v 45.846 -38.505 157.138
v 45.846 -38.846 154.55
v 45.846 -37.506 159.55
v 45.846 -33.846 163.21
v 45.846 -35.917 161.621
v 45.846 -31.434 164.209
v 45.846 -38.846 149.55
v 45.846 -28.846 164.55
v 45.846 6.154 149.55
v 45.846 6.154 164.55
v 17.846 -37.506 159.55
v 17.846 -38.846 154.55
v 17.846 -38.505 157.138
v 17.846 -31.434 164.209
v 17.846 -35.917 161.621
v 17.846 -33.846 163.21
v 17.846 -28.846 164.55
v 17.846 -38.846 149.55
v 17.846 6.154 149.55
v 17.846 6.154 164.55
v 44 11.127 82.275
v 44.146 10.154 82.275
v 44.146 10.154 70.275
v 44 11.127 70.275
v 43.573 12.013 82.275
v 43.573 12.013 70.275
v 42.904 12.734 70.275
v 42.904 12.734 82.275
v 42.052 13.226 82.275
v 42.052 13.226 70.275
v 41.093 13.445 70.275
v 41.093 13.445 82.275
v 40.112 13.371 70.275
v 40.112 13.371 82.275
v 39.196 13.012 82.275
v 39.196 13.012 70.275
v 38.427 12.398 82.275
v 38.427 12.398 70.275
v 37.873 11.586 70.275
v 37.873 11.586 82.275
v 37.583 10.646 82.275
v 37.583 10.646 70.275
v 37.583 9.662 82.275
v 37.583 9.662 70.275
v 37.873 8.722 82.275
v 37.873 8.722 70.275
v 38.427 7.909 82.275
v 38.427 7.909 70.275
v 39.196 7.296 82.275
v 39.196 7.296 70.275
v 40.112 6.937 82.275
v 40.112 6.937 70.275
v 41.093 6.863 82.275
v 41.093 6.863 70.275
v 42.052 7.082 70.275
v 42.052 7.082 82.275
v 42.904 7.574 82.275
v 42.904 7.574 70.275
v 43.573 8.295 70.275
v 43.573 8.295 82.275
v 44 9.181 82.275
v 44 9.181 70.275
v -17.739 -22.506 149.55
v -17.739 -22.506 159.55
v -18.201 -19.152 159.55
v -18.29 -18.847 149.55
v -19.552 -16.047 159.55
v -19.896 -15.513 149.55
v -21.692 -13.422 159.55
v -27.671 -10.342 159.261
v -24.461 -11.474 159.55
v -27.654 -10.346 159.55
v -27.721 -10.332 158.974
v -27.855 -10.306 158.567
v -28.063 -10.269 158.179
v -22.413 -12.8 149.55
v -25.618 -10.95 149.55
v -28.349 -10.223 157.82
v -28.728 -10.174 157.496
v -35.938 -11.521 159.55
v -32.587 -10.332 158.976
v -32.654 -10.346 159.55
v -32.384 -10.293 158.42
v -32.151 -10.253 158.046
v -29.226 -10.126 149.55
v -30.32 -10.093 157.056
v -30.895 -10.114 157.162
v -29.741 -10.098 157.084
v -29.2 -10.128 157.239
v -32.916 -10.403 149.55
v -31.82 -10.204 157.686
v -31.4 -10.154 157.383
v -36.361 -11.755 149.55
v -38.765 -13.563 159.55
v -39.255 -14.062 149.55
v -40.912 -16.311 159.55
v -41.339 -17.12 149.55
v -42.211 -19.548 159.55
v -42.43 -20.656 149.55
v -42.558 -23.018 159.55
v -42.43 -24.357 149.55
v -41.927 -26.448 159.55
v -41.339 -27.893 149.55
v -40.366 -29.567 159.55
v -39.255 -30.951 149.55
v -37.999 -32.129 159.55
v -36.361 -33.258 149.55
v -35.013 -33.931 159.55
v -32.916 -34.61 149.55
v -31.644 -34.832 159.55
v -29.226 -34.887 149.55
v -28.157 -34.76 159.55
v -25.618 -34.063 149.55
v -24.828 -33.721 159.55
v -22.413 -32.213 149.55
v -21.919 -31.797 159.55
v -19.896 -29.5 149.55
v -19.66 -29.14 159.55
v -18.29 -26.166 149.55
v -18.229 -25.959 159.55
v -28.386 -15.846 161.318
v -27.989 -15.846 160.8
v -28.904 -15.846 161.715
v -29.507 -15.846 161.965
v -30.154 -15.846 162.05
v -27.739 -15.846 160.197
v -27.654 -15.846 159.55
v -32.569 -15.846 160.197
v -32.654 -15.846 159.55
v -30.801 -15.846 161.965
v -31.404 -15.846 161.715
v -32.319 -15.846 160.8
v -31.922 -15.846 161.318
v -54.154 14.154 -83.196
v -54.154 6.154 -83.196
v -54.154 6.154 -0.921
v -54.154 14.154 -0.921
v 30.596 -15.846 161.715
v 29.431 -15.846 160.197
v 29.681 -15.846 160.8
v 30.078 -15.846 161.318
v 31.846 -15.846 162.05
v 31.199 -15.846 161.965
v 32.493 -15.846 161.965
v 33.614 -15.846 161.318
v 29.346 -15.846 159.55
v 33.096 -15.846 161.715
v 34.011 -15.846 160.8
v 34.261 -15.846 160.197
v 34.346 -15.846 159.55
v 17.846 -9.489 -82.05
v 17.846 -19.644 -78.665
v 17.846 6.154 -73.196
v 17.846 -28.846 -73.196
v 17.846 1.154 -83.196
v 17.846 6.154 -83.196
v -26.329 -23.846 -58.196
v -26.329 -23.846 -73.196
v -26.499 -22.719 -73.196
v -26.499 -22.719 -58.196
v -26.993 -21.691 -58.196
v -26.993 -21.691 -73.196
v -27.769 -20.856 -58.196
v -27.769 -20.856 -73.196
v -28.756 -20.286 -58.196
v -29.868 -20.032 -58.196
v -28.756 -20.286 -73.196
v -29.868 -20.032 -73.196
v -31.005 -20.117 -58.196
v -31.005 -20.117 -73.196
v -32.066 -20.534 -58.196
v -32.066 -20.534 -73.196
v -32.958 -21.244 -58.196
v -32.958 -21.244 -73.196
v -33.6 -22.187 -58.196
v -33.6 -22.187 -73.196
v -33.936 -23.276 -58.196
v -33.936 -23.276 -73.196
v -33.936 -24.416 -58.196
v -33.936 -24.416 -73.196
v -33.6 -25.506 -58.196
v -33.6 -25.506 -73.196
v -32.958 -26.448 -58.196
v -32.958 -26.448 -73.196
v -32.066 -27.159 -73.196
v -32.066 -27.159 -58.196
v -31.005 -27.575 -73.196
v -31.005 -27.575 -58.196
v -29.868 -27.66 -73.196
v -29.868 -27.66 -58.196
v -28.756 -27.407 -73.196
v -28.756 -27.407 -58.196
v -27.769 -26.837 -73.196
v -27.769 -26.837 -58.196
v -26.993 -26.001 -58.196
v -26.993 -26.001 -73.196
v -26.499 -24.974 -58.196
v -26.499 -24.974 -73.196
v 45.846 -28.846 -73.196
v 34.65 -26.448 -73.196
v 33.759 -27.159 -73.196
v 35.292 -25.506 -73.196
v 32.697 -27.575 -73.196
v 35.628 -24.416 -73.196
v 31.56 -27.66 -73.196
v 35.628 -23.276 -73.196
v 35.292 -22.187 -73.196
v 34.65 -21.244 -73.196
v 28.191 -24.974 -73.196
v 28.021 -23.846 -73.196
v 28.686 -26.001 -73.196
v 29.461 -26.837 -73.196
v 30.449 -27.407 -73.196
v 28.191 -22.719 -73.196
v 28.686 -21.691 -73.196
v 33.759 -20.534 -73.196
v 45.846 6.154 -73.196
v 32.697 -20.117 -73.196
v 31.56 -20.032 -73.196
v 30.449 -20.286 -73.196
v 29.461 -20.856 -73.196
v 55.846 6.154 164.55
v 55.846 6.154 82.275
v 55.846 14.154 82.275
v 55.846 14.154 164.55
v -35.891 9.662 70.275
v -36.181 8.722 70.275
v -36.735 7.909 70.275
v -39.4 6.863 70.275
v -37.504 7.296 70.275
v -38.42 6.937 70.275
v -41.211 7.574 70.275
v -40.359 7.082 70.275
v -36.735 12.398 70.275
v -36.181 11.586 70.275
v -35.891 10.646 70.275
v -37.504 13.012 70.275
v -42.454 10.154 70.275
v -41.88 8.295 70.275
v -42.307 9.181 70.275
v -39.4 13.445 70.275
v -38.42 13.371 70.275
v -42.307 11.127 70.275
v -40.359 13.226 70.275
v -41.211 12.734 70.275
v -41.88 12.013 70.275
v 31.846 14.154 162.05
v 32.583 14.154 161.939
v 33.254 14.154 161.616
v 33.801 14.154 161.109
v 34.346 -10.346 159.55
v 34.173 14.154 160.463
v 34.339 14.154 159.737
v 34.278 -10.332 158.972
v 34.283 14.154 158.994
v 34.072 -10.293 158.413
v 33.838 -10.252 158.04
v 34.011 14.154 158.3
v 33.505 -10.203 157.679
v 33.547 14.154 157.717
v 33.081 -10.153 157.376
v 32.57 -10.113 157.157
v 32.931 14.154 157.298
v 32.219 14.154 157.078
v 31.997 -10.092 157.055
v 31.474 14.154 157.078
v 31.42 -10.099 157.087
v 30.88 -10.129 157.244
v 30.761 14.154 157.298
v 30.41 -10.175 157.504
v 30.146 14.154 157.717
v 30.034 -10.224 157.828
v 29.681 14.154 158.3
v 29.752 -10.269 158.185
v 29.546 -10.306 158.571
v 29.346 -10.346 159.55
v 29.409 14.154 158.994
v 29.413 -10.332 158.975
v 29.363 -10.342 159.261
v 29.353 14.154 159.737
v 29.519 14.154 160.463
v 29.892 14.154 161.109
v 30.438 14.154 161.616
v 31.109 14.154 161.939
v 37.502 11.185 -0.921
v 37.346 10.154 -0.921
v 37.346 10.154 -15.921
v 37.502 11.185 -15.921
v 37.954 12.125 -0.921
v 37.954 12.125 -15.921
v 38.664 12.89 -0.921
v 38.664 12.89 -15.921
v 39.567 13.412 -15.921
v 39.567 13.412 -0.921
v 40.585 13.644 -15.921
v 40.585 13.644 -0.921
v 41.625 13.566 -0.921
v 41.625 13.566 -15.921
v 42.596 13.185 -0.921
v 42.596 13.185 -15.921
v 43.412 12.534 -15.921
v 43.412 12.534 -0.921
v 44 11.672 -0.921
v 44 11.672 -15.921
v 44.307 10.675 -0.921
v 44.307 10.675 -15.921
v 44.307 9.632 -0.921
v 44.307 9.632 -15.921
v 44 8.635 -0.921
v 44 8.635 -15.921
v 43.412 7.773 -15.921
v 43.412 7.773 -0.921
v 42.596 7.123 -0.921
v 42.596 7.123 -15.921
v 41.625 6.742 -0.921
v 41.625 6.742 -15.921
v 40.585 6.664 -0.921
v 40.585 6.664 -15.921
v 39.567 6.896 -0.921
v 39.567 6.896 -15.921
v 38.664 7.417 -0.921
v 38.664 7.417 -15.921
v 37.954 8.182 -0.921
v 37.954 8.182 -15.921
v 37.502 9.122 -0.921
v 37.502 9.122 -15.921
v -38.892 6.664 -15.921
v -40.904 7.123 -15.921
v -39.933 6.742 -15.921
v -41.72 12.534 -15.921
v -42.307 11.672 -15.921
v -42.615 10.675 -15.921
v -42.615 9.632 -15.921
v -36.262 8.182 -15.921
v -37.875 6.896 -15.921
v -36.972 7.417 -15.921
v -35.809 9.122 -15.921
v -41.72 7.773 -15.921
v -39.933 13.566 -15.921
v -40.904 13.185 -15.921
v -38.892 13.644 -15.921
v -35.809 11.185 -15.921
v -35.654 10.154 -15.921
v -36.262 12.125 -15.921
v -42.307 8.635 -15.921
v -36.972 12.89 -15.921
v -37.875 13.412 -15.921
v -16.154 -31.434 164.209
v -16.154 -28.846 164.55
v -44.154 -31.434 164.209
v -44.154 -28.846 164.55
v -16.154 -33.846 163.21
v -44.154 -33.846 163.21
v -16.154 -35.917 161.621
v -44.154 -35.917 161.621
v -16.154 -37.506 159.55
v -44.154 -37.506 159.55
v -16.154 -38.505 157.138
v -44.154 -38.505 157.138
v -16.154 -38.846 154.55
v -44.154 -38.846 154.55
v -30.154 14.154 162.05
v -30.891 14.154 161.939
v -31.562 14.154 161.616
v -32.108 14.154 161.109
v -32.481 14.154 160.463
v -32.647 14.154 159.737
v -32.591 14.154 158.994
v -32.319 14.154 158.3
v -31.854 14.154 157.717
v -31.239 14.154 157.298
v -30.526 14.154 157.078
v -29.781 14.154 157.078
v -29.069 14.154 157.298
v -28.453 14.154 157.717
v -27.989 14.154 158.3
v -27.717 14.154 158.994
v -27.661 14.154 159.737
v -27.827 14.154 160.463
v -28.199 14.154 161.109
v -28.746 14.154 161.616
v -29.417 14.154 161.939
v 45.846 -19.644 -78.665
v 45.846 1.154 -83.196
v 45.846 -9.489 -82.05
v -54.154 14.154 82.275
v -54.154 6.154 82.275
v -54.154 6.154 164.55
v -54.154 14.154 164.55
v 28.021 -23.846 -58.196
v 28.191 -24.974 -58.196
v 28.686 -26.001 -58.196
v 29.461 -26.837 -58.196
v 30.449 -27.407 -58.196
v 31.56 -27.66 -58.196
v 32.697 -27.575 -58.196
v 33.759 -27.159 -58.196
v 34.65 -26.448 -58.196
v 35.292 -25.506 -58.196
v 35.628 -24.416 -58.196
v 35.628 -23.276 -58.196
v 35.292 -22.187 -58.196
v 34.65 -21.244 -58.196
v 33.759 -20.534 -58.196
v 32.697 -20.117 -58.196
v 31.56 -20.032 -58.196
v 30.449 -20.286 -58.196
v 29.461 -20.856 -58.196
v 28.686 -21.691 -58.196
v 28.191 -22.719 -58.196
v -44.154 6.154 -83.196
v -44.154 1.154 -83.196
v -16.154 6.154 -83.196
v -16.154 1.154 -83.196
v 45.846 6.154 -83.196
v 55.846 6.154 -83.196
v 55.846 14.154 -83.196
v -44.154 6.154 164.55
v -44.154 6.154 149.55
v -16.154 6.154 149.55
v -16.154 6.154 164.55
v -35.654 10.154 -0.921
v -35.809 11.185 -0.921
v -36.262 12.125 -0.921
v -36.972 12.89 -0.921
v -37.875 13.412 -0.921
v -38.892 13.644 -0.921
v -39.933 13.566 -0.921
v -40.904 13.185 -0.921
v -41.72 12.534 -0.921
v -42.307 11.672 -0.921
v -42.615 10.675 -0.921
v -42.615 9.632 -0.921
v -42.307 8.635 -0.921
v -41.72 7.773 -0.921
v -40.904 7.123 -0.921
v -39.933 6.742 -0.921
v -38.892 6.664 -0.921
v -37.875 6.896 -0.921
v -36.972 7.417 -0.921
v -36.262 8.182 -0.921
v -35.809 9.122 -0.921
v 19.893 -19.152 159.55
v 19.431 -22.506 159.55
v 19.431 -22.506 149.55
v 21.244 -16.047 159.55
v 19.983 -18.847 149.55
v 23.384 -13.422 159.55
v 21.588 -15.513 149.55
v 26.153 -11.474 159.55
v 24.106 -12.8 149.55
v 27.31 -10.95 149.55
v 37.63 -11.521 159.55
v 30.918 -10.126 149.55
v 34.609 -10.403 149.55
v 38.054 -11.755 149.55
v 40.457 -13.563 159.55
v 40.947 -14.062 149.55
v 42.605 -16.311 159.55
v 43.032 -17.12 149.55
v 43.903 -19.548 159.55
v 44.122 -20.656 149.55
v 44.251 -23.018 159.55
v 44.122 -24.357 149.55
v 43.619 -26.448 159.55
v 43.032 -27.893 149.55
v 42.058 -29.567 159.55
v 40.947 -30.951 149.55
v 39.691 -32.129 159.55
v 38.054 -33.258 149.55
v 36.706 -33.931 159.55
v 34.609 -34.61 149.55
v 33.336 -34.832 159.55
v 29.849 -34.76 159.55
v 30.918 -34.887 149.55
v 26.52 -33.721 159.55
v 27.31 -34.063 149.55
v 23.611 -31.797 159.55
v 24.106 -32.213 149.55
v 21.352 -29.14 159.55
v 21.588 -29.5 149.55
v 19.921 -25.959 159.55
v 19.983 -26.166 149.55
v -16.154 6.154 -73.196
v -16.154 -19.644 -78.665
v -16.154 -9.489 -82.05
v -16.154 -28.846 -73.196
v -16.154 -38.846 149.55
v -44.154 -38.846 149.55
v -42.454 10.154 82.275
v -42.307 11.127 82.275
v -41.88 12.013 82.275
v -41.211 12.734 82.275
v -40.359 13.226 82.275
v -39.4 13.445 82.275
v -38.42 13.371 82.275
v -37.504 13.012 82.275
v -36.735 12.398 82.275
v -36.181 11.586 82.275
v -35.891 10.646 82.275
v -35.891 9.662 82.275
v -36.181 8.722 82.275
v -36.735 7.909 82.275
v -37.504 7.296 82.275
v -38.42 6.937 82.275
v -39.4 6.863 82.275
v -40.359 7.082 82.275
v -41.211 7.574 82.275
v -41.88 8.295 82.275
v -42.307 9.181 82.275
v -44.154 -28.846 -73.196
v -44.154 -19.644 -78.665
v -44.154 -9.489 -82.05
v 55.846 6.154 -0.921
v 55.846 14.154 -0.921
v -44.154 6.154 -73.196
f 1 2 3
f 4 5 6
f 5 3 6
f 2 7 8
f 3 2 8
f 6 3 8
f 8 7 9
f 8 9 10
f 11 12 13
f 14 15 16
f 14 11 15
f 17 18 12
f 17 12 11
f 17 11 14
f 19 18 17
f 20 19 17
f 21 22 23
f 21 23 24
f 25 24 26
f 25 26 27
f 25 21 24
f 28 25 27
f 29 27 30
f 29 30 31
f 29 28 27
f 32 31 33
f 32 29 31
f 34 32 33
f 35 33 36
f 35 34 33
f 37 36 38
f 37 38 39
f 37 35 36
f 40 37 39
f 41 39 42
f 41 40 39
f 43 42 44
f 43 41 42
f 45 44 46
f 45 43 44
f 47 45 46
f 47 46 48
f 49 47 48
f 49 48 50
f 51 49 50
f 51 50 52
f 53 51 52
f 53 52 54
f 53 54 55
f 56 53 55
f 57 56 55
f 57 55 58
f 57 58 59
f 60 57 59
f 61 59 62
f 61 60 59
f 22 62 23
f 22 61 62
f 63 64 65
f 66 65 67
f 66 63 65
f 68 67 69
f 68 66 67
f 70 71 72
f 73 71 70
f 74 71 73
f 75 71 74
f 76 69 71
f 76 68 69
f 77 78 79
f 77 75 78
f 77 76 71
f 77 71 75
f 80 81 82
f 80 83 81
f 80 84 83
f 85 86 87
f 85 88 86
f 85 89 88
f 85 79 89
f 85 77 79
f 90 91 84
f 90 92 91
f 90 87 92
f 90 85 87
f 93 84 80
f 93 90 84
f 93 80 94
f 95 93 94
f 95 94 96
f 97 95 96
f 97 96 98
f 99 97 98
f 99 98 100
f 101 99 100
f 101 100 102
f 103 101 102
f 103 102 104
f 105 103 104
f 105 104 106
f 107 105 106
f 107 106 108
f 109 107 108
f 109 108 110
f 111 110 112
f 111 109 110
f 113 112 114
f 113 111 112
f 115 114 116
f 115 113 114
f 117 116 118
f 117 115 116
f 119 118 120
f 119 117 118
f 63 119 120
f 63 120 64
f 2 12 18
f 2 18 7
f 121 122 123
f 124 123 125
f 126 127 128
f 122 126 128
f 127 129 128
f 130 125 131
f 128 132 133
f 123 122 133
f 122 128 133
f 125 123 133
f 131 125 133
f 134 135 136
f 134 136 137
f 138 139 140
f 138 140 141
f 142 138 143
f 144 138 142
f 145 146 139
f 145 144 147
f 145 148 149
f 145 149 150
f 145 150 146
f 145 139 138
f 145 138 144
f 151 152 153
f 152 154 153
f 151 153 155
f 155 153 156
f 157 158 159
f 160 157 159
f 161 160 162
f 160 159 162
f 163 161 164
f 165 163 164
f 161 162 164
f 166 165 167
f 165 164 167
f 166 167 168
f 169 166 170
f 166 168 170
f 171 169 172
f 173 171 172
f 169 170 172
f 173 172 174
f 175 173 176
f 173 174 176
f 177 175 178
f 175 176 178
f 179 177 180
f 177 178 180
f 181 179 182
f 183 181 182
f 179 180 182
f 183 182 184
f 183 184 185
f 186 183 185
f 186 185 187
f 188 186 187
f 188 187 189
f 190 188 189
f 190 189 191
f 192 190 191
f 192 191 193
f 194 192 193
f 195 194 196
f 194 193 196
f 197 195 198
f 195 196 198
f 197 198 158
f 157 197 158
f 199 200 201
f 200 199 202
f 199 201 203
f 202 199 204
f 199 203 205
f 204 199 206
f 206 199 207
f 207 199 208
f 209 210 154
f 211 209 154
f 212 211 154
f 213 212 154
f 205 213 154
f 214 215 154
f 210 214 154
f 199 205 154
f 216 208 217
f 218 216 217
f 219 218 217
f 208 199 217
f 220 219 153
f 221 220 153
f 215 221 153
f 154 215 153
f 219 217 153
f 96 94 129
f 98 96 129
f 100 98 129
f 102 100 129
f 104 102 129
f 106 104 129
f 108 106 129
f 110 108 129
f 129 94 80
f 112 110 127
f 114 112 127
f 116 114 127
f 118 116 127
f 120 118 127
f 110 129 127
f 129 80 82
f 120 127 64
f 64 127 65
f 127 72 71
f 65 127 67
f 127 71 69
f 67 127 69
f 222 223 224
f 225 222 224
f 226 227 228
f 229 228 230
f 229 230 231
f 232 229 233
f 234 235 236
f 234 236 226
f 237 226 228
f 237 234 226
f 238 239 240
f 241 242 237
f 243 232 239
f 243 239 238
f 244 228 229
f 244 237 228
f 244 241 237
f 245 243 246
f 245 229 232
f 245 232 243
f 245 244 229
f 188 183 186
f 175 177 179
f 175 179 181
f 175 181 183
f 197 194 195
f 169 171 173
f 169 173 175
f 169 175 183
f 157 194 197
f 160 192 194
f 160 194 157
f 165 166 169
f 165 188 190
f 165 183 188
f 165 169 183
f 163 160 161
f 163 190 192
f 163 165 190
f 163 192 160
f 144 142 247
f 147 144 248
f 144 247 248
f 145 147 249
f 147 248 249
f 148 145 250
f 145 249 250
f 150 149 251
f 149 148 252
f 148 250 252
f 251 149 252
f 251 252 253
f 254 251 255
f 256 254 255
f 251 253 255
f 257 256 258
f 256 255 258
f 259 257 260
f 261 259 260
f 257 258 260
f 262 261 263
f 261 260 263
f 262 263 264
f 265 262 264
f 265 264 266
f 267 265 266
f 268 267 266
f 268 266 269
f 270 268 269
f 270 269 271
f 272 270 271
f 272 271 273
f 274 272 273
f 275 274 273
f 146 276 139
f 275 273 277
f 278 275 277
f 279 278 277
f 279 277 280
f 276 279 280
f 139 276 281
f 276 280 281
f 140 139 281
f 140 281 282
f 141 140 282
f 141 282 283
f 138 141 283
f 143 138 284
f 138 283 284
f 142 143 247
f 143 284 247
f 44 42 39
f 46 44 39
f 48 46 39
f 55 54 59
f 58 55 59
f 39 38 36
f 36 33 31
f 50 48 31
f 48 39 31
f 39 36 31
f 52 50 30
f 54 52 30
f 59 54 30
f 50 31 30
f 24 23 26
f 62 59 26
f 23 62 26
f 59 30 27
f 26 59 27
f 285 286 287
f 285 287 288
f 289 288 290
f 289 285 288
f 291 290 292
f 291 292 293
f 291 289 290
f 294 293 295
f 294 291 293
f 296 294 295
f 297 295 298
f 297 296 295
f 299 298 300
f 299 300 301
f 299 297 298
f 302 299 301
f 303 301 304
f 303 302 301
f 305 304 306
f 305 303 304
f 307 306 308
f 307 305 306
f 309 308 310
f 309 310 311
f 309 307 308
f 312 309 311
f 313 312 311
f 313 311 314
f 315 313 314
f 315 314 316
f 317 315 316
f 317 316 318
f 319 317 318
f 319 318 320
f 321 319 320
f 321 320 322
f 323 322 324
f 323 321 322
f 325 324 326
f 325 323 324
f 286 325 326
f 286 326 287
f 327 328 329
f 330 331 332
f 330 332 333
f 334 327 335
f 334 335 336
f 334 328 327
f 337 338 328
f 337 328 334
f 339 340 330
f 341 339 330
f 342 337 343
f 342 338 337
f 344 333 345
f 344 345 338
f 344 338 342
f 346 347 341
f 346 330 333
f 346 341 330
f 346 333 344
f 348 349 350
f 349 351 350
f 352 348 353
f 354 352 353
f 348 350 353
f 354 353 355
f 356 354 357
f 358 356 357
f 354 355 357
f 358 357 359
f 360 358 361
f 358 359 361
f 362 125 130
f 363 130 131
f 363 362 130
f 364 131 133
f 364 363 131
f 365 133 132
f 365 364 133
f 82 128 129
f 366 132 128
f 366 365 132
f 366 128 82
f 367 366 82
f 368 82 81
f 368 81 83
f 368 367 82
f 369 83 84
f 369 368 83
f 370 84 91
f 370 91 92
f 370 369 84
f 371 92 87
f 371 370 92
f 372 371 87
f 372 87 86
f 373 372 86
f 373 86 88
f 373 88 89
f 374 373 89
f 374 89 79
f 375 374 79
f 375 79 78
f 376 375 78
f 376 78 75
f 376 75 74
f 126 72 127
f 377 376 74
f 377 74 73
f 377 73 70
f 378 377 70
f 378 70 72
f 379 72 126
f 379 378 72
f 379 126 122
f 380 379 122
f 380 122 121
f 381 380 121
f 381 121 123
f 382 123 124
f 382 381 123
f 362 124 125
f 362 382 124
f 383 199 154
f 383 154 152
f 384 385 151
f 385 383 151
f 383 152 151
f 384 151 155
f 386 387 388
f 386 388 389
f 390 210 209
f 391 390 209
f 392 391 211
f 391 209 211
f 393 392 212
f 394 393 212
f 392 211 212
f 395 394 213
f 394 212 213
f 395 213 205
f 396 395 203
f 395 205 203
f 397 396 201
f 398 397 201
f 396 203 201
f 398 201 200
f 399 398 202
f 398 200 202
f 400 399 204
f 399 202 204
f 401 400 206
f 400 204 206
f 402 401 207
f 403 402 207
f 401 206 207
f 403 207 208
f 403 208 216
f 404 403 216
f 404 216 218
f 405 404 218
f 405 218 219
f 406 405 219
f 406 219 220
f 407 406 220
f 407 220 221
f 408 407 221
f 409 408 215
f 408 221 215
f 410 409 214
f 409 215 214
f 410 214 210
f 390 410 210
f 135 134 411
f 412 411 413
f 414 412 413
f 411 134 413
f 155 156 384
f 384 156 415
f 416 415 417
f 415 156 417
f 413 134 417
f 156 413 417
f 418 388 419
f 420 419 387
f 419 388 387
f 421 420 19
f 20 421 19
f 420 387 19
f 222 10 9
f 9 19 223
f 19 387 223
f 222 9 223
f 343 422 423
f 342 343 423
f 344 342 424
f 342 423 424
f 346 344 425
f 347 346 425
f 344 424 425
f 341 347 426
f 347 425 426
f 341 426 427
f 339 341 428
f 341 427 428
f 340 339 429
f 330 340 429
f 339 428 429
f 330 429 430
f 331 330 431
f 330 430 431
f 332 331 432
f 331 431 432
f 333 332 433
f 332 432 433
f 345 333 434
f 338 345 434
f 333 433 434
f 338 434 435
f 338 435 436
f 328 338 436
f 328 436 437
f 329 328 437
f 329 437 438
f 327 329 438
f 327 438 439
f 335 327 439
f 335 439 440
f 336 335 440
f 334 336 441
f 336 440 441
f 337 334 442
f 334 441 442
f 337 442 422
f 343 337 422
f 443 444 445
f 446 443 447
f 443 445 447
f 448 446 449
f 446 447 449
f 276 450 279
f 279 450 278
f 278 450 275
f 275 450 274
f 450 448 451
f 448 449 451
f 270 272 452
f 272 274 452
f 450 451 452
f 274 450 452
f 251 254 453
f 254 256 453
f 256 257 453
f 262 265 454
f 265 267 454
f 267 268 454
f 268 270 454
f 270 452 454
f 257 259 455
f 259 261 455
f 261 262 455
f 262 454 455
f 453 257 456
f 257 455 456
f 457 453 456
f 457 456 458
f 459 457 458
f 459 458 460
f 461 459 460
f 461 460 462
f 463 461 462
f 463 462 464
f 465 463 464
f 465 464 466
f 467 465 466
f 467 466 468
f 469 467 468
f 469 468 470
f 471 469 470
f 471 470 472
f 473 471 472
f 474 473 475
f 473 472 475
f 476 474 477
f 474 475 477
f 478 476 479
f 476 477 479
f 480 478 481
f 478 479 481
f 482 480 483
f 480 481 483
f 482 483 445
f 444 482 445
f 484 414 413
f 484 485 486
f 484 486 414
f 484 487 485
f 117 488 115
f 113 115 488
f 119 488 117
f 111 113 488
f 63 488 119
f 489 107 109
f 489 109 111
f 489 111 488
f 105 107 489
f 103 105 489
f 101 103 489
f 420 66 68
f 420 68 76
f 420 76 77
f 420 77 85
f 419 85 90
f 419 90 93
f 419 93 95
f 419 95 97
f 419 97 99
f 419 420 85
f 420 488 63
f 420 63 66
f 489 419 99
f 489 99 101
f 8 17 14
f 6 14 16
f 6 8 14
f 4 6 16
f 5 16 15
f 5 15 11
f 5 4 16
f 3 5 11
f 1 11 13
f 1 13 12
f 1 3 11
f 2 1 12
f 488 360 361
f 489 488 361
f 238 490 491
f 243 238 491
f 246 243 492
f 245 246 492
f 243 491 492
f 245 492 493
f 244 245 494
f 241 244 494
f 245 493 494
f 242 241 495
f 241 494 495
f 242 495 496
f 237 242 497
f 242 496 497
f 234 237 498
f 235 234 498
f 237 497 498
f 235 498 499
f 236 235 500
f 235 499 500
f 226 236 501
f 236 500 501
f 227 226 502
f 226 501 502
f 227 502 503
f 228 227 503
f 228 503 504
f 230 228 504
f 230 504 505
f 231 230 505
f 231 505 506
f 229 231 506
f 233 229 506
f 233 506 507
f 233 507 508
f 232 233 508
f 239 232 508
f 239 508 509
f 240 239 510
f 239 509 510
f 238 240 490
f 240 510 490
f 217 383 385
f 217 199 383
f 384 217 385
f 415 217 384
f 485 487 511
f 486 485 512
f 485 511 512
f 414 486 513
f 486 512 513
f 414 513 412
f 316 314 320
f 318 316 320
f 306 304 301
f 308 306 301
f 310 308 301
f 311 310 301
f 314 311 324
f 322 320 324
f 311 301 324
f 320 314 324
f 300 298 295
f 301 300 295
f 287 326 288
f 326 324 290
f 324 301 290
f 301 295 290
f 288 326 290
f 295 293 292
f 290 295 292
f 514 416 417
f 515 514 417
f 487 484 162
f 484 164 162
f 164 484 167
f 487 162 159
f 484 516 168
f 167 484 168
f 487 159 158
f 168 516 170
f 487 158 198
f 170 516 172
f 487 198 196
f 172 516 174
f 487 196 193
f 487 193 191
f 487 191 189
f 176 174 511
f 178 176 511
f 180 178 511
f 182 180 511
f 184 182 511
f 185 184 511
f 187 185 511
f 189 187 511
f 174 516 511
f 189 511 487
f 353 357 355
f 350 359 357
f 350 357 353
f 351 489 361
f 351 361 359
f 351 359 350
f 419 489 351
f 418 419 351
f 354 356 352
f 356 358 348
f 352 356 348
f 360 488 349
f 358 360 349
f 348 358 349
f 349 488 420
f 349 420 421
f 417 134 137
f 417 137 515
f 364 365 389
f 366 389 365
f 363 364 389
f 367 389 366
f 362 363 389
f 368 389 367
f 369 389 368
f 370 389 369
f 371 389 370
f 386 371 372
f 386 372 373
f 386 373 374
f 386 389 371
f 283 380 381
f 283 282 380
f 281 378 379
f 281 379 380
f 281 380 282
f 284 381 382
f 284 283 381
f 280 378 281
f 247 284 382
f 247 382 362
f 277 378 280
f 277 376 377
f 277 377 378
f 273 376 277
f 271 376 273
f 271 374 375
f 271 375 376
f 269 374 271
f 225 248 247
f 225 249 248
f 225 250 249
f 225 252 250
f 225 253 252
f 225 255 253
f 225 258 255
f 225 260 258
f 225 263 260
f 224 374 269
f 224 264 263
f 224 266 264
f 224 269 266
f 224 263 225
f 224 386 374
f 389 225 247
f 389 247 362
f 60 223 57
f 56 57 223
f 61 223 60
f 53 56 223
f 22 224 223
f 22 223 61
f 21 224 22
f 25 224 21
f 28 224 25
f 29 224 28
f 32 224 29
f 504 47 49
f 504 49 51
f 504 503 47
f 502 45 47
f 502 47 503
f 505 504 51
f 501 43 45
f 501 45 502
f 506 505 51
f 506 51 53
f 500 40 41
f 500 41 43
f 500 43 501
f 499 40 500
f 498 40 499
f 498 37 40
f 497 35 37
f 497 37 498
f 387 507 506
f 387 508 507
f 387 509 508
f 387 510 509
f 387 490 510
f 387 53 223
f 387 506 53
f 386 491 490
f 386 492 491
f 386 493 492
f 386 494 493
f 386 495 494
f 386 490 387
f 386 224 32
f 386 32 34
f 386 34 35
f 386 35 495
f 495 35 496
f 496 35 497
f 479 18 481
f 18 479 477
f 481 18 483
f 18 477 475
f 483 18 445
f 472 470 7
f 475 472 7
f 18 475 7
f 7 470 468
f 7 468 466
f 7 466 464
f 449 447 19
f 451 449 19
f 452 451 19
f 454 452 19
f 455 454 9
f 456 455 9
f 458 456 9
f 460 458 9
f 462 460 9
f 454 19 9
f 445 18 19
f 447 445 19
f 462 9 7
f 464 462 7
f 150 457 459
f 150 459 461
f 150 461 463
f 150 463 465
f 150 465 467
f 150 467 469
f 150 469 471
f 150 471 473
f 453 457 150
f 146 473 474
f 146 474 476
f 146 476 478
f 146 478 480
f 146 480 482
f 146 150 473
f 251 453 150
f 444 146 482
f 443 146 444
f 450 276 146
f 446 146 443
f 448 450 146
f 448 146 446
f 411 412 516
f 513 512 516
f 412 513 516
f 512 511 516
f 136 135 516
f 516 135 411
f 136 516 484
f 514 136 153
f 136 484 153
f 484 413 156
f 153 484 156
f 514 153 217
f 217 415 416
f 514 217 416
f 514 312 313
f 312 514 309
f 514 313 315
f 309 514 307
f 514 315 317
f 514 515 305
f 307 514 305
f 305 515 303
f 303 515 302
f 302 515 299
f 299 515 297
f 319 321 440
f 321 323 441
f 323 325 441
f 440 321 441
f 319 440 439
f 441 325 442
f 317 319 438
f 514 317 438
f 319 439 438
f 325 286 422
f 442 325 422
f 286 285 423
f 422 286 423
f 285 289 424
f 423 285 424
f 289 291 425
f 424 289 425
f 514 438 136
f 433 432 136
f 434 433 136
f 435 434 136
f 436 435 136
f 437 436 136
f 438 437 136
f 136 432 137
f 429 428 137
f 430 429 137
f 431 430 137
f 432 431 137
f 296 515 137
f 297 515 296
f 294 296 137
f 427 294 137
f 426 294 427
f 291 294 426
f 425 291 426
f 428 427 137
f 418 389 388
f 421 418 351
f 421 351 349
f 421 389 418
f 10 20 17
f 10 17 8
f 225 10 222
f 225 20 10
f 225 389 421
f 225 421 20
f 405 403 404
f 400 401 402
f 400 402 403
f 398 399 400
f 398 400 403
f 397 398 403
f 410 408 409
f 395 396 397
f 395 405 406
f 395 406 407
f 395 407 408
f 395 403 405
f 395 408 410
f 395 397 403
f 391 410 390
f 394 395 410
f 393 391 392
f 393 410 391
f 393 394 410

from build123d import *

# Parameters (mm, degrees)
SKETCH_1_W             = 110
SKETCH_1_H             = 8
EXTRUDE_1_DEPTH        = 164.55
SKETCH_7_W             = 28
SKETCH_7_H             = 15
EXTRUDE_2_DEPTH        = 45
FILLET_1_R             = 10
SKETCH_10_R            = 12.415
CUT_EXTRUDE_3_DEPTH    = 10
SKETCH_11_R            = 2.5
CUT_EXTRUDE_4_DEPTH    = 30
FILLET_1_OF_MIRROR_1_R = 10
SKETCH_13_W            = 28
SKETCH_13_H            = 10
EXTRUDE_3_DEPTH        = 35
FILLET_2_R             = 50
SKETCH_14_R            = 3.825
EXTRUDE_4_DEPTH        = 15
MIRROR_START           = -44.153846154
MIRROR_2_DEPTH         = 28
MIRROR_START_2         = 10
MIRROR_2_2_OUTLINE_R   = 3.825
MIRROR_2_2_DEPTH       = 15
SKETCH5_R              = 3.5
CUT_EXTRUDE2_DEPTH     = 15
SKETCH6_R              = 3.3
BOSS_EXTRUDE1_DEPTH    = 12


with BuildPart() as part:
    # Эскиз1 → Бобышка-Вытянуть1 (new body)
    with BuildSketch(Plane.XY):
        with Locations((0.846153846, 10.153846154)):
            Rectangle(SKETCH_1_W, SKETCH_1_H)
    extrude(amount=EXTRUDE_1_DEPTH)

    # Эскиз7 → Бобышка-Вытянуть2 (add)
    with BuildSketch(Plane.XZ.offset(-6.153846154)):
        with Locations((31.846153846, 157.05)):
            Rectangle(SKETCH_7_W, SKETCH_7_H)
    extrude_2 = extrude(amount=EXTRUDE_2_DEPTH)

    # Скругление1
    fillet_1_edges = [part.edges().sort_by_distance(p)[0] for p in [
        (31.846153846, -38.846153846, 164.55),
    ]]
    fillet(fillet_1_edges, radius=FILLET_1_R)

    # Эскиз10 → Вырез-Вытянуть3 (cut)
    with BuildSketch(Plane(origin=(0, 0, 149.55), x_dir=(-1, 0, 0), z_dir=(0, 0, -1))):
        with Locations((-31.846153846, -22.506407884)):
            Circle(SKETCH_10_R)
    cut_extrude_3 = extrude(amount=-CUT_EXTRUDE_3_DEPTH, mode=Mode.SUBTRACT)

    # Эскиз11 → Вырез-Вытянуть4 (cut)
    with BuildSketch(Plane(origin=(0, 14.153846154, 0), x_dir=(1, 0, 0), z_dir=(0, 1, 0))):
        with Locations(Location((31.846153846, -159.55, 0), (0, 0, 270))):
            Circle(SKETCH_11_R)
    cut_extrude_4 = extrude(amount=-CUT_EXTRUDE_4_DEPTH, mode=Mode.SUBTRACT)

    # Зеркальное отражение1: Бобышка-Вытянуть2, Вырез-Вытянуть3, Вырез-Вытянуть4 across plane
    add(extrude_2.mirror(Plane.ZY.offset(-0.846153846)))
    add(cut_extrude_3.mirror(Plane.ZY.offset(-0.846153846)), mode=Mode.SUBTRACT)
    add(cut_extrude_4.mirror(Plane.ZY.offset(-0.846153846)), mode=Mode.SUBTRACT)

    # Скругление1 of Зеркальное отражение1
    fillet_1_of_mirror_1_edges = [part.edges().sort_by_distance(p)[0] for p in [
        (-30.153846154, -38.846153846, 164.55),
    ]]
    fillet(fillet_1_of_mirror_1_edges, radius=FILLET_1_OF_MIRROR_1_R)

    # Эскиз13 → Бобышка-Вытянуть3 (add)
    with BuildSketch(Plane(origin=(0, 6.153846154, 0), x_dir=(-1, 0, 0), z_dir=(0, -1, 0))):
        with Locations((-31.846153846, -5)):
            Rectangle(SKETCH_13_W, SKETCH_13_H)
    extrude(amount=EXTRUDE_3_DEPTH)

    # Скругление2
    # the kernel refuses this fillet: 50 mm, written as the material it takes off along each edge
    with BuildSketch(Plane(origin=(-57.153846154, -28.846153846, 0), x_dir=(0, 1, 0), z_dir=(1, 0, 0))) as fillet_2_piece_1:
        with BuildLine():
            CenterArc((30, 50), FILLET_2_R, 233.130102354, 36.869897646)
            Line((0, 10), (0, 0))
            Line((0, 0), (30, 0))
        make_face()
    extrude(amount=178, mode=Mode.SUBTRACT)

    # Эскиз14 → Бобышка-Вытянуть4 (add)
    with BuildSketch(Plane.XY.offset(10)):
        with Locations(Location((31.846153846, -23.846153846, 0), (0, 0, 180))):
            Circle(SKETCH_14_R)
    extrude(amount=EXTRUDE_4_DEPTH)

    # Зеркальное отражение2: read off the stored shape, not the designer's step
    # Зеркальное отражение2 outline → Зеркальное отражение2 (add)
    with BuildSketch(Plane.YZ.offset(MIRROR_START)):
        with BuildLine():
            Line((1.153846154, 0), (6.153846154, 0))
            Line((6.153846154, 0), (6.153846154, 10))
            Line((6.153846154, 10), (-28.846153846, 10))
            ThreePointArc((-28.846153846, 10), (-14.657542147, 2.565835097), (1.153846154, 0))
        make_face()
    extrude(amount=MIRROR_2_DEPTH)

    # Mirror 2 2 outline → Mirror 2 2 (add)
    with BuildSketch(Plane.XY.offset(MIRROR_START_2)):
        with Locations((-30.153846154, -23.846153846)):
            Circle(MIRROR_2_2_OUTLINE_R)
    extrude(amount=MIRROR_2_2_DEPTH)


with BuildPart() as body_2:
    # Split1: the piece on the far side of the plane
    add(part.part)
    split(bisect_by=Plane(origin=(0, 0, 82.275), x_dir=(-1, 0, 0), z_dir=(0, 0, -1)), keep=Keep.BOTTOM)

    # Sketch6 → Boss-Extrude1 (add)
    with BuildSketch(Plane(origin=(0, 0, 82.275), x_dir=(-1, 0, 0), z_dir=(0, 0, -1))):
        with Locations((39.153846154, 10.153846154)):
            Circle(SKETCH6_R)
    boss_extrude1 = extrude(amount=BOSS_EXTRUDE1_DEPTH)

    # Mirror2: Boss-Extrude1 across plane
    add(boss_extrude1.mirror(Plane.ZY.offset(-0.846153846)))


with BuildPart() as part_1:
    add(part.part)

    # Split1
    split(bisect_by=Plane(origin=(0, 0, 82.275), x_dir=(-1, 0, 0), z_dir=(0, 0, -1)), keep=Keep.TOP)


with BuildPart() as part_2:
    # Body-Move/Copy1: moved
    add(part_1.part.moved(Location((0, 0, -83.19616445))))

    # Sketch5 → Cut-Extrude2 (cut)
    with BuildSketch(Plane.XY.offset(-0.92116445)):
        with Locations((-39.153846154, 10.153846154)):
            Circle(SKETCH5_R)
    cut_extrude2 = extrude(amount=-CUT_EXTRUDE2_DEPTH, mode=Mode.SUBTRACT)

    # Mirror1: Cut-Extrude2 across plane
    add(cut_extrude2.mirror(Plane.ZY.offset(-0.846153846)), mode=Mode.SUBTRACT)


solid = Compound([body_2.part, part_2.part])
